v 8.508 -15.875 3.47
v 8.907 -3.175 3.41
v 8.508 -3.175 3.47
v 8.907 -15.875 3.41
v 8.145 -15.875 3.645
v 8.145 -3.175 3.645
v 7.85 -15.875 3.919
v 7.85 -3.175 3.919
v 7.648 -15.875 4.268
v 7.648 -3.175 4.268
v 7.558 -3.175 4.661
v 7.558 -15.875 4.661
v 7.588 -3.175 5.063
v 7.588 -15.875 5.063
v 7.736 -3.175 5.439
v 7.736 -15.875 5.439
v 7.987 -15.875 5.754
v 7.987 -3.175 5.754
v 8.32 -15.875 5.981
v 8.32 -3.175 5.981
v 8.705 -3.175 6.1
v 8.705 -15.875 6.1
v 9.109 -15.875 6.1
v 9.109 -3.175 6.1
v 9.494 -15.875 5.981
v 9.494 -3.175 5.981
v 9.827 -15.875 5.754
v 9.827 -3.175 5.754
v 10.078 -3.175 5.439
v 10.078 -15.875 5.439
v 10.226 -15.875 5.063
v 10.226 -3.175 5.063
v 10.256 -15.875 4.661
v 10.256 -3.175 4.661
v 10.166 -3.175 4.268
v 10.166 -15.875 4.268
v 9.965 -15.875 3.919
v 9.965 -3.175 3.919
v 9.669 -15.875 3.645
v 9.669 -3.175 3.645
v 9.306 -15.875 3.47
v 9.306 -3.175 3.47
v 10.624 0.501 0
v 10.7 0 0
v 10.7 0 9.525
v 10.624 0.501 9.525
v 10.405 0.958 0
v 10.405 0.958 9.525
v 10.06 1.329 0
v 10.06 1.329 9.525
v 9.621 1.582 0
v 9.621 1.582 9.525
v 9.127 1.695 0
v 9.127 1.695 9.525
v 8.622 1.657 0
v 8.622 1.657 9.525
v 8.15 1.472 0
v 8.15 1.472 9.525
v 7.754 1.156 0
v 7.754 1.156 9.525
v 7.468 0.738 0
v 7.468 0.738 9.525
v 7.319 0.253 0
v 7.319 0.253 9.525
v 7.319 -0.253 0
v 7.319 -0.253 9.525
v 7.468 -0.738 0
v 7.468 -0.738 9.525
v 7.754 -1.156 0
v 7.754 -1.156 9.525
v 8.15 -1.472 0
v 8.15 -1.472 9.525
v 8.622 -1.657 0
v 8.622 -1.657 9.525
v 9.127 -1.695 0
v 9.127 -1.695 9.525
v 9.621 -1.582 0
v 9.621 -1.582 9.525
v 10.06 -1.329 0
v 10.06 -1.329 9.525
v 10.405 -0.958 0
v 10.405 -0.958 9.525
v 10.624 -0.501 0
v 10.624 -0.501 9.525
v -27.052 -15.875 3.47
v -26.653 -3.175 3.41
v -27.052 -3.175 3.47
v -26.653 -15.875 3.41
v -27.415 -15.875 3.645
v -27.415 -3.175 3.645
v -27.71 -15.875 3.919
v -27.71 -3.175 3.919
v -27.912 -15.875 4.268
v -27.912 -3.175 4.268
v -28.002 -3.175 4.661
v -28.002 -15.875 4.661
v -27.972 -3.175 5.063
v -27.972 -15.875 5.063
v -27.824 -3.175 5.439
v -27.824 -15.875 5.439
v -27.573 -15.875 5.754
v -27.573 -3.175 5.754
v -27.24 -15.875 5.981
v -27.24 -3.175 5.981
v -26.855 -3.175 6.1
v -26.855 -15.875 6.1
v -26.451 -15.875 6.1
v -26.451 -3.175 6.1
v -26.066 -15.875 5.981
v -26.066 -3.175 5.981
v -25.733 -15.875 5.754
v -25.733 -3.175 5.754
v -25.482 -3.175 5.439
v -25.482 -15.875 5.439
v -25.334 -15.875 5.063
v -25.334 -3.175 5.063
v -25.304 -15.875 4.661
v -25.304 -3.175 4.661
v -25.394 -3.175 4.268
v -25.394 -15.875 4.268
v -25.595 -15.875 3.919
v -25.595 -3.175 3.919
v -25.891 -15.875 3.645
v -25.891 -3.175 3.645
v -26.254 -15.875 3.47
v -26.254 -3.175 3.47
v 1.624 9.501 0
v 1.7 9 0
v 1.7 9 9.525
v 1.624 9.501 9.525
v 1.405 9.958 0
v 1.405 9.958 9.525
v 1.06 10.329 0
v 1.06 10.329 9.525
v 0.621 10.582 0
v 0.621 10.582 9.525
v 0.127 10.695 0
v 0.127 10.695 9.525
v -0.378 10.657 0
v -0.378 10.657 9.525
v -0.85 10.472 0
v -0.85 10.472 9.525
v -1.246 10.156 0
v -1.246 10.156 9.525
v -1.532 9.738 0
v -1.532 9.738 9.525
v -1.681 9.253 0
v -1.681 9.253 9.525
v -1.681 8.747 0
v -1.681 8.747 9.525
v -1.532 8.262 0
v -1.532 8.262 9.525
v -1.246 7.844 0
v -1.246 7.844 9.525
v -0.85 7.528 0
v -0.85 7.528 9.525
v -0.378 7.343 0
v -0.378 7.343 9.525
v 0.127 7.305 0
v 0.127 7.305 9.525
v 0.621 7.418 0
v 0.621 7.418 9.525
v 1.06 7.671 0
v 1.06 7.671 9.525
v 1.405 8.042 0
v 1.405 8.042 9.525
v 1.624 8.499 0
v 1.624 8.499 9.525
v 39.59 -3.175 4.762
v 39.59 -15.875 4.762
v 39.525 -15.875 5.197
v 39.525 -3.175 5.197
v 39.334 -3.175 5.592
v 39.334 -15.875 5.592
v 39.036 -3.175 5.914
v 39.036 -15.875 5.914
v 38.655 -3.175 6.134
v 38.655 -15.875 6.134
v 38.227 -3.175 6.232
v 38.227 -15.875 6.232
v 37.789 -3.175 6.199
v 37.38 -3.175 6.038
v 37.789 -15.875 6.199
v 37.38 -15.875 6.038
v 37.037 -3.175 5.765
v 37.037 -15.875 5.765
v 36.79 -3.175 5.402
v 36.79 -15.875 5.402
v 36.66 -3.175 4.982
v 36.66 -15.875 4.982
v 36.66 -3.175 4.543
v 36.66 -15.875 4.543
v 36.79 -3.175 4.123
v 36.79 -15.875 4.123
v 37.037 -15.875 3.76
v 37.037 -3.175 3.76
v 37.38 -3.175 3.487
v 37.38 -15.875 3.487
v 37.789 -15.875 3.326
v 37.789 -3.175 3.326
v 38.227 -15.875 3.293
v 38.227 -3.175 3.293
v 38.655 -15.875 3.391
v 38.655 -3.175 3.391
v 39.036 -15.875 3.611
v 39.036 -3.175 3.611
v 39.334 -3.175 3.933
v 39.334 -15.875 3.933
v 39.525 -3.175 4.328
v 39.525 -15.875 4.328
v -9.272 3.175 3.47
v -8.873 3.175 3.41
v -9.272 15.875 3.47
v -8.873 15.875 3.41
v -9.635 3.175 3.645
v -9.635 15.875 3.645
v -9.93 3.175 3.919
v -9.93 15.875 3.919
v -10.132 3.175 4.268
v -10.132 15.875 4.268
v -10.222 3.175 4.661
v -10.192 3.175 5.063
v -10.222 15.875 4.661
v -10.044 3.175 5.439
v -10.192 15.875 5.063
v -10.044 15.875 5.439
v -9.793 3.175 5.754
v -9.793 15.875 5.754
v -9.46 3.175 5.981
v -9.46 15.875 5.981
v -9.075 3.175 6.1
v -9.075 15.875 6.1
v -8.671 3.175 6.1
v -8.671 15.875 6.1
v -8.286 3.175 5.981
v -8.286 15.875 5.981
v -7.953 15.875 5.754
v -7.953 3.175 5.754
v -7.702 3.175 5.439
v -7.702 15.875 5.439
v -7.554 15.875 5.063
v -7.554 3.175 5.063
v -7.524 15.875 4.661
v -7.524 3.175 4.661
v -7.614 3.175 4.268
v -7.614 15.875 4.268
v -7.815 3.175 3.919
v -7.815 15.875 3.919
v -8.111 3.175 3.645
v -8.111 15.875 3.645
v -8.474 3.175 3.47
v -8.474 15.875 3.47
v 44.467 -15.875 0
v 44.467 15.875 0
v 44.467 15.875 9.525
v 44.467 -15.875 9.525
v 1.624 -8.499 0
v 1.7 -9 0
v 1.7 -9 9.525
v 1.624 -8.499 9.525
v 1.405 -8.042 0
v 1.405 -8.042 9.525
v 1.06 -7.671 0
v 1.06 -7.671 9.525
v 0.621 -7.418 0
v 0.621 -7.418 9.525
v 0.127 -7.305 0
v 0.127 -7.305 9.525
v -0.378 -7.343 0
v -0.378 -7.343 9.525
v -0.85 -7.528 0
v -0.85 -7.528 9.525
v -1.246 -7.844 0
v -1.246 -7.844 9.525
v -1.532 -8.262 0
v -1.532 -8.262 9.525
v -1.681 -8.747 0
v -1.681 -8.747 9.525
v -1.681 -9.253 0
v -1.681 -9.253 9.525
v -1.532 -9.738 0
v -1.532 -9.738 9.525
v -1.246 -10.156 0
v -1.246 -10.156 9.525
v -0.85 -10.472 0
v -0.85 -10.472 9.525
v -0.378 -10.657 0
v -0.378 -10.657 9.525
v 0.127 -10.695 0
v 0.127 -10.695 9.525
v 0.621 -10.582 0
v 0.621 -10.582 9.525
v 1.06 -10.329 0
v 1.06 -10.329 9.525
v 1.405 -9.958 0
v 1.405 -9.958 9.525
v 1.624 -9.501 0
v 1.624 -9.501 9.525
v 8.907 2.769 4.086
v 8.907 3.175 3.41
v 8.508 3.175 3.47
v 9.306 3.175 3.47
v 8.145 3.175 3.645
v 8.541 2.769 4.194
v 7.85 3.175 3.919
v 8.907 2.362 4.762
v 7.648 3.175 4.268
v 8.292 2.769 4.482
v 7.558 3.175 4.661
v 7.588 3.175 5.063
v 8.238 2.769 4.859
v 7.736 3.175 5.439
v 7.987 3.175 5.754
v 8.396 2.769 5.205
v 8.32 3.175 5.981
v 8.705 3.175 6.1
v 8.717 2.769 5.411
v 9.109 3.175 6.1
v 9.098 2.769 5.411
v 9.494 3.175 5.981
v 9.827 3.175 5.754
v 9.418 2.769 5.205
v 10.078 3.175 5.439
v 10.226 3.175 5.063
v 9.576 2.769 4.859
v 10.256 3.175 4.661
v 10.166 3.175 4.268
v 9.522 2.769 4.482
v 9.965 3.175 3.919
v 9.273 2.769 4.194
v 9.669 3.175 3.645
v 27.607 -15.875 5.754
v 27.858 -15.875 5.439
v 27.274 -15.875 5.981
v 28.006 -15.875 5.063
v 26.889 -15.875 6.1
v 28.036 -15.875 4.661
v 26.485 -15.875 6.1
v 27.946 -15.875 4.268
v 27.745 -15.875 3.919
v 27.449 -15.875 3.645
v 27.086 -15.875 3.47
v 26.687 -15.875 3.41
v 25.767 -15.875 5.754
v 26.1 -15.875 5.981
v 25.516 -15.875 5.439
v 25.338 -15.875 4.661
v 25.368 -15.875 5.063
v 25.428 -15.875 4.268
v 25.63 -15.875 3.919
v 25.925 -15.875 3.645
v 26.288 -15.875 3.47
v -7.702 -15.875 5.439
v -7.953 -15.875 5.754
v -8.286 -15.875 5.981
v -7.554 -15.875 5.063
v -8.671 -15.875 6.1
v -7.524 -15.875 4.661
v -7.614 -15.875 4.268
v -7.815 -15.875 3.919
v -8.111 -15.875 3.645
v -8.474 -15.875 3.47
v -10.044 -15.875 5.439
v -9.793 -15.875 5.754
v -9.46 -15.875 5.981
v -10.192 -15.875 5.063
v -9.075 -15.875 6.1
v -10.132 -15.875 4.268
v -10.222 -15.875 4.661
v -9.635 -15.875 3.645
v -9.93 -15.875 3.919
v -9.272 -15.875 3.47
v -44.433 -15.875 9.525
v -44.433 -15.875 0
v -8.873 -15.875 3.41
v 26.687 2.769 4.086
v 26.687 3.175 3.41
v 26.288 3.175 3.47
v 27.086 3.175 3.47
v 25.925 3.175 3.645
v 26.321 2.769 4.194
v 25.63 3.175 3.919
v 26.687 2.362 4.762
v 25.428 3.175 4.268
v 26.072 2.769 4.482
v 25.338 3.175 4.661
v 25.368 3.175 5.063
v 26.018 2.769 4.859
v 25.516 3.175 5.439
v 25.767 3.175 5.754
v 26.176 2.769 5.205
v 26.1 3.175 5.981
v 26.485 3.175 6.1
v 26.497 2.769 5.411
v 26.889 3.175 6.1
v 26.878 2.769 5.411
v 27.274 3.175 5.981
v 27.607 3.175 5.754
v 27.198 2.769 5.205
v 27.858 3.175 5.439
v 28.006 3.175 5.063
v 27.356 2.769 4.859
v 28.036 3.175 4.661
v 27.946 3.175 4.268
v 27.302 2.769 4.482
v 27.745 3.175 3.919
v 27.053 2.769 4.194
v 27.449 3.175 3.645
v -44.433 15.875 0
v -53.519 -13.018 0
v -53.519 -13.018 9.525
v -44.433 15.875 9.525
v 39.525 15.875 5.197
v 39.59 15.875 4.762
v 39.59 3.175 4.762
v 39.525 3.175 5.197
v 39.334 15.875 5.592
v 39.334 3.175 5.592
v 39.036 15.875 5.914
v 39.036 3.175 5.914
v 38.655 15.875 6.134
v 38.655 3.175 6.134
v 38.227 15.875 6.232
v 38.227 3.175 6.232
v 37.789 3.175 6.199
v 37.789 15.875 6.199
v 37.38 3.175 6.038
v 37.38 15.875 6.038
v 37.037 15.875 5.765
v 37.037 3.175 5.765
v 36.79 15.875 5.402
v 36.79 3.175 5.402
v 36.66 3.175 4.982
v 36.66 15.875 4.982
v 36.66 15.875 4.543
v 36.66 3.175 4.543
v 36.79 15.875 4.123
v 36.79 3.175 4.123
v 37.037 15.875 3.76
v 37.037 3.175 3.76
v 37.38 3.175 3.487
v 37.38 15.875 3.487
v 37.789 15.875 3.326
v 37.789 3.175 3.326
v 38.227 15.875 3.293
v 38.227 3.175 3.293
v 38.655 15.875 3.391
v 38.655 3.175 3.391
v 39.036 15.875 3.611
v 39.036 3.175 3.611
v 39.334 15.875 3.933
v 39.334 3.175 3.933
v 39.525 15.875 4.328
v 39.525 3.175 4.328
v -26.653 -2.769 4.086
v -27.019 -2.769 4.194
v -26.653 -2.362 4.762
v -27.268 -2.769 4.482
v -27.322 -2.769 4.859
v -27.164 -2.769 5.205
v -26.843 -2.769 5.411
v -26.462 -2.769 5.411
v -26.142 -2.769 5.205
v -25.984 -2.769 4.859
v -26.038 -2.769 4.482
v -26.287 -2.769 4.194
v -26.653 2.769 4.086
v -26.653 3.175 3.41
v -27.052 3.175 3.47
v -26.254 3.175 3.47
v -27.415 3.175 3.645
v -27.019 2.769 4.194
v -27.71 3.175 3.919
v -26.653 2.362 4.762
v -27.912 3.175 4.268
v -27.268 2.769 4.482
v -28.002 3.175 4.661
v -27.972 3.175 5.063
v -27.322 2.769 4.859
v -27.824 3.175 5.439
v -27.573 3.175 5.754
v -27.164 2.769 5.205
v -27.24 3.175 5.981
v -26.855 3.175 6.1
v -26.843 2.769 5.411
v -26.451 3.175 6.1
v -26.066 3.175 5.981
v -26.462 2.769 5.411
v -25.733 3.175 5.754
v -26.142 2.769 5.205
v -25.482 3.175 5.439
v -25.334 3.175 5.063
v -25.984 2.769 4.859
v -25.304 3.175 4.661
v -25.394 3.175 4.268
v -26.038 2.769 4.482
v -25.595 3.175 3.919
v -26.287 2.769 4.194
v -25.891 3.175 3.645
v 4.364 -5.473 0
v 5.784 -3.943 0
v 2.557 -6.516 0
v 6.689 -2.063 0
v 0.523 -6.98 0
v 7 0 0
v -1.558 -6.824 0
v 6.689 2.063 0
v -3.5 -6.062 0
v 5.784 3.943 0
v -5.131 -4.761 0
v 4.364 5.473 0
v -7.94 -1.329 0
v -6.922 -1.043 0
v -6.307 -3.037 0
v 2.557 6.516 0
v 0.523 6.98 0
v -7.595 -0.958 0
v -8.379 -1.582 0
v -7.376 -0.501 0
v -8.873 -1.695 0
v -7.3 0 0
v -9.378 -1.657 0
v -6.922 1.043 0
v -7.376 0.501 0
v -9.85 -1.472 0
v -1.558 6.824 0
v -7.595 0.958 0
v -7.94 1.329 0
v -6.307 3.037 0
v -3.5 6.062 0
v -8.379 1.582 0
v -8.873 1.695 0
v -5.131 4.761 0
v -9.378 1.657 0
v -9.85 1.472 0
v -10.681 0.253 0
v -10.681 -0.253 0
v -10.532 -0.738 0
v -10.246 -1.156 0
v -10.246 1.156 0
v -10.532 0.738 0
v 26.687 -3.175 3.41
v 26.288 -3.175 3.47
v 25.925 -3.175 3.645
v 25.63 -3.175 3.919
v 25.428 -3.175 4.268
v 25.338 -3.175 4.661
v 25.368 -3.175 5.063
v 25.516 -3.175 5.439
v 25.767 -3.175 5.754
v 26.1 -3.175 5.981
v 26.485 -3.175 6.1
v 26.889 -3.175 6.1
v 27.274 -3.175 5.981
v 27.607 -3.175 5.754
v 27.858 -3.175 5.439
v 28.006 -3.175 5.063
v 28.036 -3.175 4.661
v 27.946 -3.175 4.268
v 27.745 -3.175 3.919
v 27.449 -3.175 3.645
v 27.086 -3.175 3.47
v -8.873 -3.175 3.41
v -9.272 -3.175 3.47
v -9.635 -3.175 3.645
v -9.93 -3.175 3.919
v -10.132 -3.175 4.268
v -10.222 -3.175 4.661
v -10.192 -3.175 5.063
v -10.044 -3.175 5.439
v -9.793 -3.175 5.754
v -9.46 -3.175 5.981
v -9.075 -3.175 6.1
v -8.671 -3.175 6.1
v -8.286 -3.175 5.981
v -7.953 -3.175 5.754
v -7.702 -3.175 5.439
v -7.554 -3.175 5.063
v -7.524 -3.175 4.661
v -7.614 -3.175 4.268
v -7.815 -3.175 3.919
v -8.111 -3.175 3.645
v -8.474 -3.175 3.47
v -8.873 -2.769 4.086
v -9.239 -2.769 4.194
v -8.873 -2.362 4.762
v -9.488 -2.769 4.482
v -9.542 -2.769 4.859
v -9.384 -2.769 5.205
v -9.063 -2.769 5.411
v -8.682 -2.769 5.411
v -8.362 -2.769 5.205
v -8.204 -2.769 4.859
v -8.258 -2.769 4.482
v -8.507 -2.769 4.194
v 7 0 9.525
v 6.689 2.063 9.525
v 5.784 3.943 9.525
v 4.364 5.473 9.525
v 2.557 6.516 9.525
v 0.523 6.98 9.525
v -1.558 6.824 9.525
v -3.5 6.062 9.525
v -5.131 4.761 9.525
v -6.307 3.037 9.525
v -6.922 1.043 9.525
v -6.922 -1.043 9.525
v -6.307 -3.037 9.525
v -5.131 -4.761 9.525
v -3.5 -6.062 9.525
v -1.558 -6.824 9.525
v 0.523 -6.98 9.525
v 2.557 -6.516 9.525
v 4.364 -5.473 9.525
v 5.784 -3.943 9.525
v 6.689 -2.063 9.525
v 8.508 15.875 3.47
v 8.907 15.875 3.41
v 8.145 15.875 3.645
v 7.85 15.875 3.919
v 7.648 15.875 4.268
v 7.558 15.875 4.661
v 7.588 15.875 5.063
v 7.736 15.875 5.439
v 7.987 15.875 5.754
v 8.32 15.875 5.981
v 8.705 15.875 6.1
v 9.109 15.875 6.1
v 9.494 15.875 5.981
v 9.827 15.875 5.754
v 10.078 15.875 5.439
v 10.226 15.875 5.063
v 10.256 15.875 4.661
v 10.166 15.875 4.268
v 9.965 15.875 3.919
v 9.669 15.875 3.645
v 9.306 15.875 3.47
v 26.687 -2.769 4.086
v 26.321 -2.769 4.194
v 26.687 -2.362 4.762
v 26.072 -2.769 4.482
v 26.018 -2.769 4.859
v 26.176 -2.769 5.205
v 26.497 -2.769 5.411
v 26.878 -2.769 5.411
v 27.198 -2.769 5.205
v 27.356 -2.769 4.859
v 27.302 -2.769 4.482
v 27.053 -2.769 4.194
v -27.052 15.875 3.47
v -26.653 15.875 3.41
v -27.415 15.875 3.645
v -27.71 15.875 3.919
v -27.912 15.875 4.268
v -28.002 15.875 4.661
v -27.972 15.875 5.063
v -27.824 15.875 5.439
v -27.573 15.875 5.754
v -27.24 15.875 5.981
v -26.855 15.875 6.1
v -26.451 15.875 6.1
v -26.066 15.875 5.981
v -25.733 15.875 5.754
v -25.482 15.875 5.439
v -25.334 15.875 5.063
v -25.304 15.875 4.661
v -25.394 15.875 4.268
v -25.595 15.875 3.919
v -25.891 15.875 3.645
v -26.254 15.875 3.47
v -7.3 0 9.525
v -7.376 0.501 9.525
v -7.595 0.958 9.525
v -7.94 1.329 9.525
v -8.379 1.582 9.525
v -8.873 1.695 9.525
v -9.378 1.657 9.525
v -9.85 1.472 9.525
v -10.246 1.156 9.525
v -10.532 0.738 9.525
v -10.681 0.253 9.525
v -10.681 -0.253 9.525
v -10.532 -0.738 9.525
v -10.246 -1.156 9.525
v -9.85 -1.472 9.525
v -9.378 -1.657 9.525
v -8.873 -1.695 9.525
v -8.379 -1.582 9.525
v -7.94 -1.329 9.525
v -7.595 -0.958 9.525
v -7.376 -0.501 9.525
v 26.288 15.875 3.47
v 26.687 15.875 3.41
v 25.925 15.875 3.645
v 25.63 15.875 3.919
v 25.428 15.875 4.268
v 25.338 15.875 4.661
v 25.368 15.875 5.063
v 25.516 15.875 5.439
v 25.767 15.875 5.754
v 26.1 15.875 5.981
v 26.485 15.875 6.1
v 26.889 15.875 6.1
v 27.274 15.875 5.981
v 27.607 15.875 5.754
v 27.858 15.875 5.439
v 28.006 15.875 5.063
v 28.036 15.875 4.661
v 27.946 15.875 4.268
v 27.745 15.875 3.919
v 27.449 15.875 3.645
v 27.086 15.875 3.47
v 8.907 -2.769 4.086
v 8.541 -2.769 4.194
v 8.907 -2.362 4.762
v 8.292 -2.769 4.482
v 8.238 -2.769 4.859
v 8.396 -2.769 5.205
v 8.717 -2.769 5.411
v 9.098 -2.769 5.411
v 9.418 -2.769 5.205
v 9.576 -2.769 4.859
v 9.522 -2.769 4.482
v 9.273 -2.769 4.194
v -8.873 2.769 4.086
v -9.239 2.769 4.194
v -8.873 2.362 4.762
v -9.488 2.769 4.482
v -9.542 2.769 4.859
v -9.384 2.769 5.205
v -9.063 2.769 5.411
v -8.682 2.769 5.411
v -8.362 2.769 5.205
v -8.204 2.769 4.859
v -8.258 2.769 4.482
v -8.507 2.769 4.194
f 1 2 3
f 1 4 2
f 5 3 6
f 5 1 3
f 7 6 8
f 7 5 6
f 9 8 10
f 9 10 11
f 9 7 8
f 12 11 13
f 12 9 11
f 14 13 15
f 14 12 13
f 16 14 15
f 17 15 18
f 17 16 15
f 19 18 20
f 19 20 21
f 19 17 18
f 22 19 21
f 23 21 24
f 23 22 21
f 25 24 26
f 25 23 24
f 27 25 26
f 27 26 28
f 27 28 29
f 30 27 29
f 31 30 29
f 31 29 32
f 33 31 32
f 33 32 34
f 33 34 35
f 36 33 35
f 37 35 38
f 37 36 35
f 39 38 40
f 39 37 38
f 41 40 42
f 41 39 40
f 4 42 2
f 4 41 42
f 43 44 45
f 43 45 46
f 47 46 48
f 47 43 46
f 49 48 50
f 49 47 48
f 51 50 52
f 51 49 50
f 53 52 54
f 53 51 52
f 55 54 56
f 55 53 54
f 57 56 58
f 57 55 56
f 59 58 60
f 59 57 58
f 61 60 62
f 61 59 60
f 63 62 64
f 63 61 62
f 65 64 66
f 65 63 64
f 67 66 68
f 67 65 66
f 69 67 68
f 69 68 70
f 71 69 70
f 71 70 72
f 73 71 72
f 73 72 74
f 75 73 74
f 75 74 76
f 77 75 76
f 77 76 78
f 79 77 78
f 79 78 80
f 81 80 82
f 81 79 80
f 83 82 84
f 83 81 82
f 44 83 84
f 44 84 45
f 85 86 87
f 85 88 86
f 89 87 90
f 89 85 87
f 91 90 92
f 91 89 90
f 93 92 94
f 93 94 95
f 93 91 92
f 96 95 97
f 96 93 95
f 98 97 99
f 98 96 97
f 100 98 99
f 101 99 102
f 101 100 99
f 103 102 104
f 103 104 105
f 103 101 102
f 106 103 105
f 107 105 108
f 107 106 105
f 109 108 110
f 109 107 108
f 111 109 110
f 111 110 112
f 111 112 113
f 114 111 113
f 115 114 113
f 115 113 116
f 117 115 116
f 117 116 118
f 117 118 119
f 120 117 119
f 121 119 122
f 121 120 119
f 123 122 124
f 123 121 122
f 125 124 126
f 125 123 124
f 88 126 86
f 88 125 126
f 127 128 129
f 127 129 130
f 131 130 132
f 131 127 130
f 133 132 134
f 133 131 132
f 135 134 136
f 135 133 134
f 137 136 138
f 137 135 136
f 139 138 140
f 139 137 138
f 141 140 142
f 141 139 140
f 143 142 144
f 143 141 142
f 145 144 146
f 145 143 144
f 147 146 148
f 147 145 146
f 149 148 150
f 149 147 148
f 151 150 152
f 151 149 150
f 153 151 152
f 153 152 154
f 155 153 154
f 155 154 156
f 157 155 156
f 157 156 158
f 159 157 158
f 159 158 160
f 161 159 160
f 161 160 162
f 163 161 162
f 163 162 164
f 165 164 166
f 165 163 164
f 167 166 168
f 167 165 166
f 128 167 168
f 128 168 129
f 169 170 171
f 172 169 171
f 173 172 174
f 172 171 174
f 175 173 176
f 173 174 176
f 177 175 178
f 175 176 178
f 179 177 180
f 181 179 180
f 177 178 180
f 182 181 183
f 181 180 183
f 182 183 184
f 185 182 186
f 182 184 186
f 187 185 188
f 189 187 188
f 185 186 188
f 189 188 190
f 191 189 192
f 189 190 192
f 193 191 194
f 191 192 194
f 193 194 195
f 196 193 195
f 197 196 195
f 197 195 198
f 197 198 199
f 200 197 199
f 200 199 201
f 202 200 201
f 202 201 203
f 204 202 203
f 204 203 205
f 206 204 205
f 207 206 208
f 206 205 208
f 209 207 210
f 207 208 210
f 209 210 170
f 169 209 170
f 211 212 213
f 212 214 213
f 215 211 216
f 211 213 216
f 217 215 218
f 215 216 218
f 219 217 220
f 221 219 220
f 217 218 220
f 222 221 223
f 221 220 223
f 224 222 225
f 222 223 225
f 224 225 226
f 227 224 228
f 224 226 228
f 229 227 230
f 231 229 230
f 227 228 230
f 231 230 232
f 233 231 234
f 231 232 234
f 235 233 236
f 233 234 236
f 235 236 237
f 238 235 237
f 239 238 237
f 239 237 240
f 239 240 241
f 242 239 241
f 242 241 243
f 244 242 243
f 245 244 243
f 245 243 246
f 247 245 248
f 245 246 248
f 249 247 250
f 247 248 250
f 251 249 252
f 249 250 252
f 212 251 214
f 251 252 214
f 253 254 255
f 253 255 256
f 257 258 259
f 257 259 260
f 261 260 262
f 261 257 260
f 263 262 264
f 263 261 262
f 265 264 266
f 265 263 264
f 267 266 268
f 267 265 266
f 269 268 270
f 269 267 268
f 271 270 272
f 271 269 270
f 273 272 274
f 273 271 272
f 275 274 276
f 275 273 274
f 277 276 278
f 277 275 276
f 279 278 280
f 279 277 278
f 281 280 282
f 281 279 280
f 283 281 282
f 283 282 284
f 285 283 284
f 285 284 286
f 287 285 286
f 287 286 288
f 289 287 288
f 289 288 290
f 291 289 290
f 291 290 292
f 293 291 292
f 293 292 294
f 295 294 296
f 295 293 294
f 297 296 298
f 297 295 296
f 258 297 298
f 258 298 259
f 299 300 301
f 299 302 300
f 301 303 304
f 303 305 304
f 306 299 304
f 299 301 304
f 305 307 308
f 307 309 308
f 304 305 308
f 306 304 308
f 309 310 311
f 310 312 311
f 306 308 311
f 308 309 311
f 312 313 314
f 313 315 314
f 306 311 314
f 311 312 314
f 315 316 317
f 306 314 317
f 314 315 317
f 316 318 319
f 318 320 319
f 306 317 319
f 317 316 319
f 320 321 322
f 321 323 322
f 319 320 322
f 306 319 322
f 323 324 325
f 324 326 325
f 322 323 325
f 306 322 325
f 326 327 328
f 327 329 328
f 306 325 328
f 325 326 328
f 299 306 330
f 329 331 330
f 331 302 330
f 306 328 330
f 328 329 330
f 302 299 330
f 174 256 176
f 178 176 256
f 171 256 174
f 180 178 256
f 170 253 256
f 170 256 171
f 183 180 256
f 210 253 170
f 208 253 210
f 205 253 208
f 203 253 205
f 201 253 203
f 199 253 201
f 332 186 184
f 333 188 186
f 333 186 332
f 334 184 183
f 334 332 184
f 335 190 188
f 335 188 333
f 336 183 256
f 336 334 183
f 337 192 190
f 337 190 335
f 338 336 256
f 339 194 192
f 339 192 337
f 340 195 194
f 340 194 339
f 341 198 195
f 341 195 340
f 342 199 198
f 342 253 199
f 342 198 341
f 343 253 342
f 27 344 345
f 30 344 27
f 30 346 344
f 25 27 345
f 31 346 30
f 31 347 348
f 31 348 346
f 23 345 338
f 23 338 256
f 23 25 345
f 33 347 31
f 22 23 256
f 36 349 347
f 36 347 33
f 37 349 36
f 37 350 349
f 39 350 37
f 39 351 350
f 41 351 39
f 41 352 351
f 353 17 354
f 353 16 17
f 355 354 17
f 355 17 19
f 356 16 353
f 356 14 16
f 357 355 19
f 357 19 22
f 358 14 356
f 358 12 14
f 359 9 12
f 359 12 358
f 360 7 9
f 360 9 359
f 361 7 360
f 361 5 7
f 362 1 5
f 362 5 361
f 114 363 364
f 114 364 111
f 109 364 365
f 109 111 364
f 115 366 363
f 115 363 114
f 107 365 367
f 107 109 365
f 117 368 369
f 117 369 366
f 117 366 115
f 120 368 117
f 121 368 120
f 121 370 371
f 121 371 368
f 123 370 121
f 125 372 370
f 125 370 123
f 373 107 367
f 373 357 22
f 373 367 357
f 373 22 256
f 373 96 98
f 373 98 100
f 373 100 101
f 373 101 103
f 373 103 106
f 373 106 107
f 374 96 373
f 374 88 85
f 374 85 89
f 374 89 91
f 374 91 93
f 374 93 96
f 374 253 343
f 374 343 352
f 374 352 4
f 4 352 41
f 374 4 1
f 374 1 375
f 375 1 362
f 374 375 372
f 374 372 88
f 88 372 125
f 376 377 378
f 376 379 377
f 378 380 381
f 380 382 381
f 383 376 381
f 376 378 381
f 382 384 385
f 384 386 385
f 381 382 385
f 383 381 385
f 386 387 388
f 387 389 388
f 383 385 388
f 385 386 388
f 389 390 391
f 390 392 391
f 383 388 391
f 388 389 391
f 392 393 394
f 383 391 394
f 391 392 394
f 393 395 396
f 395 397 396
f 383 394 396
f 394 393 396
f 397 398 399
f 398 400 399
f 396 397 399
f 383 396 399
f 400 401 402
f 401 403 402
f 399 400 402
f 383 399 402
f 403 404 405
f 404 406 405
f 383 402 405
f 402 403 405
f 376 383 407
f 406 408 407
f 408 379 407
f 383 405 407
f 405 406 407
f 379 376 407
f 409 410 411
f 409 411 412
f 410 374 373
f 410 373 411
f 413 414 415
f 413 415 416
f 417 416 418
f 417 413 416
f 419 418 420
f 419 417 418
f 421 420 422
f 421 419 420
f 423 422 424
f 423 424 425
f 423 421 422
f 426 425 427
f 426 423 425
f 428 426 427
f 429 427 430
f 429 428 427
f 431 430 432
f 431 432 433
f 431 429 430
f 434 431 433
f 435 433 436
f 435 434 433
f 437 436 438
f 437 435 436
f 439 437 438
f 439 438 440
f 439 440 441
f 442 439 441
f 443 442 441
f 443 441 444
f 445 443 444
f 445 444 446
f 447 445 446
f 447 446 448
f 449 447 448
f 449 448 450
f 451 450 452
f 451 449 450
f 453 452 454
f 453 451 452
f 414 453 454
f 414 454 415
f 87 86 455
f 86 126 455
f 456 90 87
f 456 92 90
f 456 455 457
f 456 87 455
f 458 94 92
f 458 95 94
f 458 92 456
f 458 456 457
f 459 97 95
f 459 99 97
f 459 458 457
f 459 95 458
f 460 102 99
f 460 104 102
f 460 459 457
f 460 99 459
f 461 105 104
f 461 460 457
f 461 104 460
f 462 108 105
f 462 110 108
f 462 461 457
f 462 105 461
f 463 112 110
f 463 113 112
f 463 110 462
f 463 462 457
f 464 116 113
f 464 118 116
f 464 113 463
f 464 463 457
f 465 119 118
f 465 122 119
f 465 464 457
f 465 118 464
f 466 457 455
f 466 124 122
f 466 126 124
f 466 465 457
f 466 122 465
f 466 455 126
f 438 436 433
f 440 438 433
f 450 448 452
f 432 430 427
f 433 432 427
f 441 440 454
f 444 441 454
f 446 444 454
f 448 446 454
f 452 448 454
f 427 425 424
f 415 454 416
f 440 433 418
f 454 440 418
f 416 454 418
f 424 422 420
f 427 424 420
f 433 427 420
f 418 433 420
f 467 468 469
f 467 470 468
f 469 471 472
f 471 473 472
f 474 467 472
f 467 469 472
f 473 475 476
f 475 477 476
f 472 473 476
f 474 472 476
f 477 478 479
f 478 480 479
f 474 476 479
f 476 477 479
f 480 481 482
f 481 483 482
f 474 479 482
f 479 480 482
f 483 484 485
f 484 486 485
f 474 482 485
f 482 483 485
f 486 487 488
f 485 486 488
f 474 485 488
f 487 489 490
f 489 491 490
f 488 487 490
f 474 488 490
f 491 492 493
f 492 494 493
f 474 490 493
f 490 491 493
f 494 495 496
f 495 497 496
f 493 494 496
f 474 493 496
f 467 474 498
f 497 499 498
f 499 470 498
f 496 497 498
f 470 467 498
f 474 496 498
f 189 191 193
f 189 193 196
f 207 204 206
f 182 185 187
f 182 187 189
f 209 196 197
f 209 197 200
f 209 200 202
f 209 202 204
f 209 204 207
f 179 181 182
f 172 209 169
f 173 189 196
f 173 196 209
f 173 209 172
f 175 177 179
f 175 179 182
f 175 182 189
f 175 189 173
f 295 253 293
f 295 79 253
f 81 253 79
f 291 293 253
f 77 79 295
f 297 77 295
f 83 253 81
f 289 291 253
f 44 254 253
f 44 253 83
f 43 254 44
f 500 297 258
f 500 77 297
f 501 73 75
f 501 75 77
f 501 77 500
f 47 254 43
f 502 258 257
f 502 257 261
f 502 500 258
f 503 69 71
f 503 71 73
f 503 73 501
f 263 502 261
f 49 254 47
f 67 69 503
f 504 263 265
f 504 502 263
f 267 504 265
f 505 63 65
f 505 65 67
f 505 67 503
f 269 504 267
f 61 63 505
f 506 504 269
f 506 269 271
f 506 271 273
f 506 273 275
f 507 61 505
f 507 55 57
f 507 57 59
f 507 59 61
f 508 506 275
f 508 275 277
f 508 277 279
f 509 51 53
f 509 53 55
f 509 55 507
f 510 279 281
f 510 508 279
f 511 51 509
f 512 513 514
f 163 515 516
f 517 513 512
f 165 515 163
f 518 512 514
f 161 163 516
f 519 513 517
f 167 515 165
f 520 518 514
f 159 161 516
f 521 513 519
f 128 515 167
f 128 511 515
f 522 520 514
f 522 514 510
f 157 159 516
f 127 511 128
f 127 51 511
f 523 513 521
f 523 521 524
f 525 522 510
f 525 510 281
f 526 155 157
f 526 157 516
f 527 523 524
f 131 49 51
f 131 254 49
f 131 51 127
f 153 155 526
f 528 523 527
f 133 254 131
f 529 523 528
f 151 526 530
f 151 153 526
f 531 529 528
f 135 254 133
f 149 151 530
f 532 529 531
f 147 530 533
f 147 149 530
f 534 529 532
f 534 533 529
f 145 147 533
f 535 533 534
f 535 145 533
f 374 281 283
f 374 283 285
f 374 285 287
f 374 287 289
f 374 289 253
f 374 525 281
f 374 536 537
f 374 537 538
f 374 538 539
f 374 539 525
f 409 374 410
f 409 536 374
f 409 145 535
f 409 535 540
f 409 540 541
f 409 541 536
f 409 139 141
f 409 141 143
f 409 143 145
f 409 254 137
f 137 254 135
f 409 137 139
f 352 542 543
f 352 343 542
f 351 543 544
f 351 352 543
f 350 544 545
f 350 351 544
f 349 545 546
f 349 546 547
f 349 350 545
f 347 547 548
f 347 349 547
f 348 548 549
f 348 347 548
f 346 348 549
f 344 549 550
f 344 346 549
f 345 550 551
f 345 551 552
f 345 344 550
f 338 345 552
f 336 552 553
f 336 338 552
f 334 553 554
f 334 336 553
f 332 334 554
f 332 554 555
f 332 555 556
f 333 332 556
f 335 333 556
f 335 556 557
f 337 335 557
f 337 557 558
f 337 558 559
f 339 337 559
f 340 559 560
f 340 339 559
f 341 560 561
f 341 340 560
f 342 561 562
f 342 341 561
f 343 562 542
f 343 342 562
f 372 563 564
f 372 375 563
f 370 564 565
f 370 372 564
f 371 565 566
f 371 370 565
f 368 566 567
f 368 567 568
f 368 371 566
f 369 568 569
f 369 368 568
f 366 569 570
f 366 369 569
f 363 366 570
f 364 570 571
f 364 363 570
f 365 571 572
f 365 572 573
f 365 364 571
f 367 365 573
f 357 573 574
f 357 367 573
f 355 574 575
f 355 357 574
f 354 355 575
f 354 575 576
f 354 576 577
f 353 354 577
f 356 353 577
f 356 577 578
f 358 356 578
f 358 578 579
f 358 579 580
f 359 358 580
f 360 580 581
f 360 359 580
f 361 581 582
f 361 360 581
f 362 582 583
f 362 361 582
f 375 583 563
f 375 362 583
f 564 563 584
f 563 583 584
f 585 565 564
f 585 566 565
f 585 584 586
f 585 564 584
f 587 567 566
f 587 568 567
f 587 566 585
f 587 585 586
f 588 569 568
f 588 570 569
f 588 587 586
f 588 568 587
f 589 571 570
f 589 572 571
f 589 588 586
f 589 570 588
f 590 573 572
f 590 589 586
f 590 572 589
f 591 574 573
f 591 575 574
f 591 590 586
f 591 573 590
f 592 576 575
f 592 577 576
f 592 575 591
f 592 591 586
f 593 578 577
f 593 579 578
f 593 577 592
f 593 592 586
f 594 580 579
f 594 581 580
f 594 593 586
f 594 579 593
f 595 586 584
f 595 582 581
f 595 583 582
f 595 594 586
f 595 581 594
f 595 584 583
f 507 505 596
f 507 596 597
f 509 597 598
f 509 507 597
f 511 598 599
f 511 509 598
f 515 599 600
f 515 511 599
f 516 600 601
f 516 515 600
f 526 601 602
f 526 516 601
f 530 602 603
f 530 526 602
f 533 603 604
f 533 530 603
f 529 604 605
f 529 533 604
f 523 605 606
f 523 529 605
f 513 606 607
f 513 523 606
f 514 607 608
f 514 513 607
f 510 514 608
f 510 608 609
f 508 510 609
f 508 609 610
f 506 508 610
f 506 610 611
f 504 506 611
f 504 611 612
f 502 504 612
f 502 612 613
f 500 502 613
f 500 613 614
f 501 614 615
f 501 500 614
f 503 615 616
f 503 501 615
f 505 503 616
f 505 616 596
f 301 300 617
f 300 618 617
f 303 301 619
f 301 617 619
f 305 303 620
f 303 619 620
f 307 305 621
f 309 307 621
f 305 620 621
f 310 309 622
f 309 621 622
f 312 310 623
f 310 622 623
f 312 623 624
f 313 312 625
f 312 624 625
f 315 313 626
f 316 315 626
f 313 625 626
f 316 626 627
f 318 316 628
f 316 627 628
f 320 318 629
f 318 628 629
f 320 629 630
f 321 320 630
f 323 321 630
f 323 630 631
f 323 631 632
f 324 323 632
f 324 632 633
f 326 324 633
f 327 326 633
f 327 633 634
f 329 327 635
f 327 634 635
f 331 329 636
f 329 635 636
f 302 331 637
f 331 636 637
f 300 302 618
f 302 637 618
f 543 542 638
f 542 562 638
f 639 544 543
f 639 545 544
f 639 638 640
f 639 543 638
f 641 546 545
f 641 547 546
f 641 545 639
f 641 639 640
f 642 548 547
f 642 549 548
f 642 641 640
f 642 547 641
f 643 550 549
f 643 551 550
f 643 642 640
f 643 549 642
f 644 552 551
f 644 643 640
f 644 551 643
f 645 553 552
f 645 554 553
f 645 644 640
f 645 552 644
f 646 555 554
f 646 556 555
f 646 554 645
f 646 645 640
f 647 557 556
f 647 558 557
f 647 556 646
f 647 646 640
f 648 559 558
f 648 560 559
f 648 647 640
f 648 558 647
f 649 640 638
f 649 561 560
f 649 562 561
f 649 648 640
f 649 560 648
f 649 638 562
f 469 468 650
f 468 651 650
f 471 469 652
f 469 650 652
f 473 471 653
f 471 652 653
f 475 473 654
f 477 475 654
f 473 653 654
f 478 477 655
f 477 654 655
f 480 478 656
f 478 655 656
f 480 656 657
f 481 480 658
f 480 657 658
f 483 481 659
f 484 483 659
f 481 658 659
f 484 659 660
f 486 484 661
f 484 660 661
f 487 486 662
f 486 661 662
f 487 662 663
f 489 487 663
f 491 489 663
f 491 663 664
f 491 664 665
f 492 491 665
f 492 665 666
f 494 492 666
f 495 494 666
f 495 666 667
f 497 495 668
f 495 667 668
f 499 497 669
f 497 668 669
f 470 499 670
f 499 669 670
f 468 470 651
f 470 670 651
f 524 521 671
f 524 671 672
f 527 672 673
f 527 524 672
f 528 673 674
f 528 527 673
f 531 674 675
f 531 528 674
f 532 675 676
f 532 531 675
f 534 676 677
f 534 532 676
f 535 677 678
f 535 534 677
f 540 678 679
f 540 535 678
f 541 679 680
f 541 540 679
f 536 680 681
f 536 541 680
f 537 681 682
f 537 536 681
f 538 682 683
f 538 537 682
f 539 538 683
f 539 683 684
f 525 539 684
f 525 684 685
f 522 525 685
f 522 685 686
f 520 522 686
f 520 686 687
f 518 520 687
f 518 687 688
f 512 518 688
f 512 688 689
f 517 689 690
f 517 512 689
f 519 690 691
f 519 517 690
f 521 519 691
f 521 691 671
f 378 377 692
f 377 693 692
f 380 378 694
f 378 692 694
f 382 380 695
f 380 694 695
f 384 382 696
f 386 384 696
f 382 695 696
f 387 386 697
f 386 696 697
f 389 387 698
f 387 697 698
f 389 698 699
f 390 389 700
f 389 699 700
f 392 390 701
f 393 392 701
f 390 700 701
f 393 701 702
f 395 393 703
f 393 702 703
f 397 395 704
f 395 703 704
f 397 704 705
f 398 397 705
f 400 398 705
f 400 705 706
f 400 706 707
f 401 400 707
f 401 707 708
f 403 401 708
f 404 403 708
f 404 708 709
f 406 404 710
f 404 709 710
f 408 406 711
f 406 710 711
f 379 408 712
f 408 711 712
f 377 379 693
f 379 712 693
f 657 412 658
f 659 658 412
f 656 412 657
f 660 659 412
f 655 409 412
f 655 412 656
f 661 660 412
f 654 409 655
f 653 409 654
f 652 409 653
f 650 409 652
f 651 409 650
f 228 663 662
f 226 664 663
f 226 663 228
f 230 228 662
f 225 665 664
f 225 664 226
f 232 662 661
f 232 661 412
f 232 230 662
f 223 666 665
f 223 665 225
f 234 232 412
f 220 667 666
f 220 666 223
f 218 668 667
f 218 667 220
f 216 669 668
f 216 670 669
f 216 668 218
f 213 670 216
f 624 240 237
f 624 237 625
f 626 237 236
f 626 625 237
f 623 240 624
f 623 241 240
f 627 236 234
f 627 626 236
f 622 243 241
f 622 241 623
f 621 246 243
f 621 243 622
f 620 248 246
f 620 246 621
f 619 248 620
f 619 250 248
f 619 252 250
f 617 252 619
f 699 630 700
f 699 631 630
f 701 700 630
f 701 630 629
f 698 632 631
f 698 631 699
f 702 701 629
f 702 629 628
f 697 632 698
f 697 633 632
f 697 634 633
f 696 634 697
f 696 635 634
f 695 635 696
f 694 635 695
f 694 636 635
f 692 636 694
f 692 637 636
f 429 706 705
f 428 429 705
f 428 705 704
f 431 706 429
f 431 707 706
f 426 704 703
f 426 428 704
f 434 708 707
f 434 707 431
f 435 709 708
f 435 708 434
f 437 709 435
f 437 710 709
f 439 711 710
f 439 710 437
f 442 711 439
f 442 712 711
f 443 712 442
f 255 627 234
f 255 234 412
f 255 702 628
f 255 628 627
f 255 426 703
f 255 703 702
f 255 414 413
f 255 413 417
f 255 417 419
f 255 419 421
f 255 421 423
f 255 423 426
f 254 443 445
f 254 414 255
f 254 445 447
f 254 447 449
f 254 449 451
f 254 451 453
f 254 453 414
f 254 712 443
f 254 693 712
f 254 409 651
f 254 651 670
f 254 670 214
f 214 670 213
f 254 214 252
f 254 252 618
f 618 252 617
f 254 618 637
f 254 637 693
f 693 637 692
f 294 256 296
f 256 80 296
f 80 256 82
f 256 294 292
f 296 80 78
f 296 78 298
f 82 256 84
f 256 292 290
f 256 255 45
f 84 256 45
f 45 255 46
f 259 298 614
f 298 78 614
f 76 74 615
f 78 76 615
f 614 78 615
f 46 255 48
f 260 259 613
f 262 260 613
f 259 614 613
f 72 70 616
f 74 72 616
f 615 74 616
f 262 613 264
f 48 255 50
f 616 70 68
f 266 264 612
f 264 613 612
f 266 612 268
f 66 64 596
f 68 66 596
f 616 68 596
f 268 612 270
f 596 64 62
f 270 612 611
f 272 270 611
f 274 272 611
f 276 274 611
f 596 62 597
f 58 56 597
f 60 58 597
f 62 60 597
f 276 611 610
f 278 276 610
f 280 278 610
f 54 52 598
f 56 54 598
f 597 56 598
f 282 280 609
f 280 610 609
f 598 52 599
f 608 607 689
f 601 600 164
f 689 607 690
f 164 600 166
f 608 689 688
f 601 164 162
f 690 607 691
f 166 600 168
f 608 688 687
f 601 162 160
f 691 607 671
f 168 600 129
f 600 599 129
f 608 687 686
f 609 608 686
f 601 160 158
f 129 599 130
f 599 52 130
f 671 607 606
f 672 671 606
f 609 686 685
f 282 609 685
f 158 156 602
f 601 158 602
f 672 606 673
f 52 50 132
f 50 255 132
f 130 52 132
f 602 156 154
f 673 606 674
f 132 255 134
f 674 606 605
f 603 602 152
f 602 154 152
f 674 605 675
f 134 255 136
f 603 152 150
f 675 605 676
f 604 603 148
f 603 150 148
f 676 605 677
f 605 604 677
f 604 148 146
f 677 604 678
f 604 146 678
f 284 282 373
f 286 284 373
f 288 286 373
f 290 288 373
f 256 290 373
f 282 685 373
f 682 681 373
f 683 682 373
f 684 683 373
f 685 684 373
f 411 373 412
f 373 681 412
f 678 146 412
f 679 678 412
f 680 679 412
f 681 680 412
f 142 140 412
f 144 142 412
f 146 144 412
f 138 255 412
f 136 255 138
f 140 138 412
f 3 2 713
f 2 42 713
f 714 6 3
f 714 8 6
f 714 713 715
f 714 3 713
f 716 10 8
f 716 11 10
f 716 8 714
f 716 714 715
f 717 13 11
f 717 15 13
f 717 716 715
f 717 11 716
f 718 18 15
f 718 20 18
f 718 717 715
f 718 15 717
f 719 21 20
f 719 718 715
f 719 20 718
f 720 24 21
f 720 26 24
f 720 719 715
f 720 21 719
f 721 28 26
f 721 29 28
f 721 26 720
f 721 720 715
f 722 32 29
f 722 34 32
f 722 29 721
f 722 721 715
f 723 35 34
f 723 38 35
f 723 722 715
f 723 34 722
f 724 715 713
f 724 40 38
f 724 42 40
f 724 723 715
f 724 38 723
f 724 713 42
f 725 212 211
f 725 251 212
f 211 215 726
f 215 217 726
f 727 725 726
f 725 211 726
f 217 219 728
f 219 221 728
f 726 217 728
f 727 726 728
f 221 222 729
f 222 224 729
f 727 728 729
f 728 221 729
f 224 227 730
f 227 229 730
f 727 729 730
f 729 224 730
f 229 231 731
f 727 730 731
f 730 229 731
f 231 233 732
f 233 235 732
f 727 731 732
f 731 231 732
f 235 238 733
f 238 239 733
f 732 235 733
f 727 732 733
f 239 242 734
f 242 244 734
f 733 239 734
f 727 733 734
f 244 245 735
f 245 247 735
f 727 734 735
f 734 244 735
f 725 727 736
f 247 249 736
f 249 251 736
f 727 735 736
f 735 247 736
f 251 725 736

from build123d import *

# Parameters (mm, degrees)
SKETCH1_R           = 1.7
SKETCH1_R_2         = 7
BOSS_EXTRUDE1_DEPTH = 9.525
LPATTERN1_COUNT     = 4
LPATTERN1_PITCH     = 17.78
SKETCH13_R          = 1.4732
CUT_EXTRUDE1_DEPTH  = 12.7


with BuildPart() as part:
    # Sketch1 → Boss-Extrude1 (new body)
    with BuildSketch(Plane.XY):
        Polygon((-44.432958233, 15.875), (44.467041767, 15.875), (44.467041767, -15.875), (-44.432958233, -15.875), (-53.519229126, -13.0175), align=None)
        with Locations((0, -9)):
            Circle(SKETCH1_R, mode=Mode.SUBTRACT)
        with Locations((-9, 0)):
            Circle(SKETCH1_R, mode=Mode.SUBTRACT)
        with Locations((0, 9)):
            Circle(SKETCH1_R, mode=Mode.SUBTRACT)
        with Locations((9, 0)):
            Circle(SKETCH1_R, mode=Mode.SUBTRACT)
        Circle(SKETCH1_R_2, mode=Mode.SUBTRACT)
    extrude(amount=BOSS_EXTRUDE1_DEPTH)

    # Sketch12 → Tap Drill for #6-32 Tap1 (revolve, cut)
    with BuildSketch(Plane(origin=(26.687041767, -15.875, 4.7625), x_dir=(0, 0, -1), z_dir=(1, 0, 0))):
        Polygon((0, 0), (0, 13.51269403), (1.35255, 12.7), (1.35255, 0), align=None)
    tap_drill_for_6_32_tap1 = revolve(axis=Axis((26.687041767, -22.225, 4.7625), (0, 1, 0)), mode=Mode.SUBTRACT)

    # LPattern1: Tap Drill for #6-32 Tap1 ×4
    with Locations(*[(-i * LPATTERN1_PITCH, 0, 0) for i in range(1, LPATTERN1_COUNT)]):
        add(tap_drill_for_6_32_tap1, mode=Mode.SUBTRACT)

    # Mirror8: Tap Drill for #6-32 Tap1 across plane
    add(tap_drill_for_6_32_tap1.mirror(Plane.ZX), mode=Mode.SUBTRACT)

    # Mirror8 copy 1 sketch → Mirror8 copy 1 (revolve, cut)
    with BuildSketch(Plane(origin=(8.907041767, 15.875, 4.7625), x_dir=(0, 0, -1), z_dir=(1, 0, 0))):
        Polygon((0, 0), (0, -13.51269403), (1.35255, -12.7), (1.35255, 0), align=None)
    revolve(axis=Axis((8.907041767, 22.225, 4.7625), (0, 1, 0)), mode=Mode.SUBTRACT)

    # Mirror8 copy 2 sketch → Mirror8 copy 2 (revolve, cut)
    with BuildSketch(Plane(origin=(-8.872958233, 15.875, 4.7625), x_dir=(0, 0, -1), z_dir=(1, 0, 0))):
        Polygon((0, 0), (0, -13.51269403), (1.35255, -12.7), (1.35255, 0), align=None)
    revolve(axis=Axis((-8.872958233, 22.225, 4.7625), (0, 1, 0)), mode=Mode.SUBTRACT)

    # Mirror8 copy 3 sketch → Mirror8 copy 3 (revolve, cut)
    with BuildSketch(Plane(origin=(-26.652958233, 15.875, 4.7625), x_dir=(0, 0, -1), z_dir=(1, 0, 0))):
        Polygon((0, 0), (0, -13.51269403), (1.35255, -12.7), (1.35255, 0), align=None)
    revolve(axis=Axis((-26.652958233, 22.225, 4.7625), (0, 1, 0)), mode=Mode.SUBTRACT)

    # Sketch13 → Cut-Extrude1 (cut)
    with BuildSketch(Plane.XZ.offset(15.875)):
        with Locations((38.117041767, 4.7625)):
            Circle(SKETCH13_R)
    cut_extrude1 = extrude(amount=-CUT_EXTRUDE1_DEPTH, mode=Mode.SUBTRACT)

    # Mirror9: Cut-Extrude1 across plane
    add(cut_extrude1.mirror(Plane.ZX), mode=Mode.SUBTRACT)


solid = part.part
